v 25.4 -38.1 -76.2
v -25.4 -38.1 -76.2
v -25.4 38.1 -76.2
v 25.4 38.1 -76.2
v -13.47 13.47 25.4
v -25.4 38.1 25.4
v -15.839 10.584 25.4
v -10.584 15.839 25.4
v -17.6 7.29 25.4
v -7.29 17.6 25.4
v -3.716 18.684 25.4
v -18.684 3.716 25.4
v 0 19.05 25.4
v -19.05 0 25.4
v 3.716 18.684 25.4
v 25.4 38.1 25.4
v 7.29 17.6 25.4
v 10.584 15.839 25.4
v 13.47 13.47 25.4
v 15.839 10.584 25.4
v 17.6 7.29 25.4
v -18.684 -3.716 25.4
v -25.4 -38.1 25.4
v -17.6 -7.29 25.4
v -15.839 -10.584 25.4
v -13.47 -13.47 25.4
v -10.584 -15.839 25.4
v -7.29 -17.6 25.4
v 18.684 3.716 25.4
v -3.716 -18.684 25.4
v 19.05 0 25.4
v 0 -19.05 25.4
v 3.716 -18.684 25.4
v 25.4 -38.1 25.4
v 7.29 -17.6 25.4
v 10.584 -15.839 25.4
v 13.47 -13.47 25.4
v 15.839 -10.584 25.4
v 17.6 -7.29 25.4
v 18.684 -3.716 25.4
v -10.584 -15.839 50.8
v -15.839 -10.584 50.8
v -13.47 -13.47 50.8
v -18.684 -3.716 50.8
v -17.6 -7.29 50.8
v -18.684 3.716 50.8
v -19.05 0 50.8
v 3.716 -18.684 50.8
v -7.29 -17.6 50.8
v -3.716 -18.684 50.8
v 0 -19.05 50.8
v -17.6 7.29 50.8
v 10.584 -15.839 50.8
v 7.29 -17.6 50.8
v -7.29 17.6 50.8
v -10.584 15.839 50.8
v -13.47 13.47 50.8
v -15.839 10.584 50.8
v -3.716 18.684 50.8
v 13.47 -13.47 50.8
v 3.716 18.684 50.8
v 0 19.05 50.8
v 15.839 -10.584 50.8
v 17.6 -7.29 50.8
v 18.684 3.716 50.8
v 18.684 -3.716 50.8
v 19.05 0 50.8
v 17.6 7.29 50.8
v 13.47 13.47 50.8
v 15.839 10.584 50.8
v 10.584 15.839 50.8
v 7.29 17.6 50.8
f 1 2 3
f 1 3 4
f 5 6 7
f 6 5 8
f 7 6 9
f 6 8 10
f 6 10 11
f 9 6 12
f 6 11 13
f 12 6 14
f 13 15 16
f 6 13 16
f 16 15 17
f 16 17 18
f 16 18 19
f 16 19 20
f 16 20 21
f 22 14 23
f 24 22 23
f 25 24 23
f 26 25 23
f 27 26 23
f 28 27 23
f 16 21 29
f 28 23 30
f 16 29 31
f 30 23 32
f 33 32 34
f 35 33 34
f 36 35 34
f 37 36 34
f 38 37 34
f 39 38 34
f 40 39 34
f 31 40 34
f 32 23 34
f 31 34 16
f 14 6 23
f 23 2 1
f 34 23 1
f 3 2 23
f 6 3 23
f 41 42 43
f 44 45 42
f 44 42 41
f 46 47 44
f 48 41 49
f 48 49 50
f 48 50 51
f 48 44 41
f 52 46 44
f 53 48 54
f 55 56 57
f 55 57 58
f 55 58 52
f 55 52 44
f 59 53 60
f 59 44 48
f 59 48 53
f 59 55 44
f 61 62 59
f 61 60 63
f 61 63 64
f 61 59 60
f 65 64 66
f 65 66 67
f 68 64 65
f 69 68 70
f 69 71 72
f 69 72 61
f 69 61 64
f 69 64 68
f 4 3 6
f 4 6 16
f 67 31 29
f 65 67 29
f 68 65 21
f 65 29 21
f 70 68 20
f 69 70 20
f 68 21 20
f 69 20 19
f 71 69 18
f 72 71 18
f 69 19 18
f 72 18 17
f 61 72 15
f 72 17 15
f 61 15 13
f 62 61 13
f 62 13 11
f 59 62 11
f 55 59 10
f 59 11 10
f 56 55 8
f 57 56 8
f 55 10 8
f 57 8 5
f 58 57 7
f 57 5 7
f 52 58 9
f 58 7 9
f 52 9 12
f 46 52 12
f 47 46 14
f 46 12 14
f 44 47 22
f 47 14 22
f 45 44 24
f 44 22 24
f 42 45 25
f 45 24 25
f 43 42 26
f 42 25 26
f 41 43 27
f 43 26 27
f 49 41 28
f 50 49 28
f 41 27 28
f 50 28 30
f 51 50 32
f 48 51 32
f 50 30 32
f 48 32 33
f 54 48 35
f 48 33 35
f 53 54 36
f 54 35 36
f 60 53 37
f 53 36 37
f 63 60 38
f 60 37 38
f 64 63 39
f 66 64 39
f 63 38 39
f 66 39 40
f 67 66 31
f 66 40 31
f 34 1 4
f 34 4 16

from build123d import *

# Parameters (mm, degrees)
F0_W     = 50.8
F0_H     = 101.6
F1_DEPTH = 38.1
F2_R     = 19.05
F3_DEPTH = 25.4


with BuildPart() as f1:
    # F0 (on Front) → F1 (new body, symmetric)
    with BuildSketch(Plane.XZ):
        with Locations((0, -25.4)):
            Rectangle(F0_W, F0_H)
    extrude(amount=F1_DEPTH, both=True)

    # F2 (on face) → F3 (join)
    with BuildSketch(Plane.XY.offset(25.4)):
        Circle(F2_R)
    extrude(amount=F3_DEPTH)


solid = f1.part
